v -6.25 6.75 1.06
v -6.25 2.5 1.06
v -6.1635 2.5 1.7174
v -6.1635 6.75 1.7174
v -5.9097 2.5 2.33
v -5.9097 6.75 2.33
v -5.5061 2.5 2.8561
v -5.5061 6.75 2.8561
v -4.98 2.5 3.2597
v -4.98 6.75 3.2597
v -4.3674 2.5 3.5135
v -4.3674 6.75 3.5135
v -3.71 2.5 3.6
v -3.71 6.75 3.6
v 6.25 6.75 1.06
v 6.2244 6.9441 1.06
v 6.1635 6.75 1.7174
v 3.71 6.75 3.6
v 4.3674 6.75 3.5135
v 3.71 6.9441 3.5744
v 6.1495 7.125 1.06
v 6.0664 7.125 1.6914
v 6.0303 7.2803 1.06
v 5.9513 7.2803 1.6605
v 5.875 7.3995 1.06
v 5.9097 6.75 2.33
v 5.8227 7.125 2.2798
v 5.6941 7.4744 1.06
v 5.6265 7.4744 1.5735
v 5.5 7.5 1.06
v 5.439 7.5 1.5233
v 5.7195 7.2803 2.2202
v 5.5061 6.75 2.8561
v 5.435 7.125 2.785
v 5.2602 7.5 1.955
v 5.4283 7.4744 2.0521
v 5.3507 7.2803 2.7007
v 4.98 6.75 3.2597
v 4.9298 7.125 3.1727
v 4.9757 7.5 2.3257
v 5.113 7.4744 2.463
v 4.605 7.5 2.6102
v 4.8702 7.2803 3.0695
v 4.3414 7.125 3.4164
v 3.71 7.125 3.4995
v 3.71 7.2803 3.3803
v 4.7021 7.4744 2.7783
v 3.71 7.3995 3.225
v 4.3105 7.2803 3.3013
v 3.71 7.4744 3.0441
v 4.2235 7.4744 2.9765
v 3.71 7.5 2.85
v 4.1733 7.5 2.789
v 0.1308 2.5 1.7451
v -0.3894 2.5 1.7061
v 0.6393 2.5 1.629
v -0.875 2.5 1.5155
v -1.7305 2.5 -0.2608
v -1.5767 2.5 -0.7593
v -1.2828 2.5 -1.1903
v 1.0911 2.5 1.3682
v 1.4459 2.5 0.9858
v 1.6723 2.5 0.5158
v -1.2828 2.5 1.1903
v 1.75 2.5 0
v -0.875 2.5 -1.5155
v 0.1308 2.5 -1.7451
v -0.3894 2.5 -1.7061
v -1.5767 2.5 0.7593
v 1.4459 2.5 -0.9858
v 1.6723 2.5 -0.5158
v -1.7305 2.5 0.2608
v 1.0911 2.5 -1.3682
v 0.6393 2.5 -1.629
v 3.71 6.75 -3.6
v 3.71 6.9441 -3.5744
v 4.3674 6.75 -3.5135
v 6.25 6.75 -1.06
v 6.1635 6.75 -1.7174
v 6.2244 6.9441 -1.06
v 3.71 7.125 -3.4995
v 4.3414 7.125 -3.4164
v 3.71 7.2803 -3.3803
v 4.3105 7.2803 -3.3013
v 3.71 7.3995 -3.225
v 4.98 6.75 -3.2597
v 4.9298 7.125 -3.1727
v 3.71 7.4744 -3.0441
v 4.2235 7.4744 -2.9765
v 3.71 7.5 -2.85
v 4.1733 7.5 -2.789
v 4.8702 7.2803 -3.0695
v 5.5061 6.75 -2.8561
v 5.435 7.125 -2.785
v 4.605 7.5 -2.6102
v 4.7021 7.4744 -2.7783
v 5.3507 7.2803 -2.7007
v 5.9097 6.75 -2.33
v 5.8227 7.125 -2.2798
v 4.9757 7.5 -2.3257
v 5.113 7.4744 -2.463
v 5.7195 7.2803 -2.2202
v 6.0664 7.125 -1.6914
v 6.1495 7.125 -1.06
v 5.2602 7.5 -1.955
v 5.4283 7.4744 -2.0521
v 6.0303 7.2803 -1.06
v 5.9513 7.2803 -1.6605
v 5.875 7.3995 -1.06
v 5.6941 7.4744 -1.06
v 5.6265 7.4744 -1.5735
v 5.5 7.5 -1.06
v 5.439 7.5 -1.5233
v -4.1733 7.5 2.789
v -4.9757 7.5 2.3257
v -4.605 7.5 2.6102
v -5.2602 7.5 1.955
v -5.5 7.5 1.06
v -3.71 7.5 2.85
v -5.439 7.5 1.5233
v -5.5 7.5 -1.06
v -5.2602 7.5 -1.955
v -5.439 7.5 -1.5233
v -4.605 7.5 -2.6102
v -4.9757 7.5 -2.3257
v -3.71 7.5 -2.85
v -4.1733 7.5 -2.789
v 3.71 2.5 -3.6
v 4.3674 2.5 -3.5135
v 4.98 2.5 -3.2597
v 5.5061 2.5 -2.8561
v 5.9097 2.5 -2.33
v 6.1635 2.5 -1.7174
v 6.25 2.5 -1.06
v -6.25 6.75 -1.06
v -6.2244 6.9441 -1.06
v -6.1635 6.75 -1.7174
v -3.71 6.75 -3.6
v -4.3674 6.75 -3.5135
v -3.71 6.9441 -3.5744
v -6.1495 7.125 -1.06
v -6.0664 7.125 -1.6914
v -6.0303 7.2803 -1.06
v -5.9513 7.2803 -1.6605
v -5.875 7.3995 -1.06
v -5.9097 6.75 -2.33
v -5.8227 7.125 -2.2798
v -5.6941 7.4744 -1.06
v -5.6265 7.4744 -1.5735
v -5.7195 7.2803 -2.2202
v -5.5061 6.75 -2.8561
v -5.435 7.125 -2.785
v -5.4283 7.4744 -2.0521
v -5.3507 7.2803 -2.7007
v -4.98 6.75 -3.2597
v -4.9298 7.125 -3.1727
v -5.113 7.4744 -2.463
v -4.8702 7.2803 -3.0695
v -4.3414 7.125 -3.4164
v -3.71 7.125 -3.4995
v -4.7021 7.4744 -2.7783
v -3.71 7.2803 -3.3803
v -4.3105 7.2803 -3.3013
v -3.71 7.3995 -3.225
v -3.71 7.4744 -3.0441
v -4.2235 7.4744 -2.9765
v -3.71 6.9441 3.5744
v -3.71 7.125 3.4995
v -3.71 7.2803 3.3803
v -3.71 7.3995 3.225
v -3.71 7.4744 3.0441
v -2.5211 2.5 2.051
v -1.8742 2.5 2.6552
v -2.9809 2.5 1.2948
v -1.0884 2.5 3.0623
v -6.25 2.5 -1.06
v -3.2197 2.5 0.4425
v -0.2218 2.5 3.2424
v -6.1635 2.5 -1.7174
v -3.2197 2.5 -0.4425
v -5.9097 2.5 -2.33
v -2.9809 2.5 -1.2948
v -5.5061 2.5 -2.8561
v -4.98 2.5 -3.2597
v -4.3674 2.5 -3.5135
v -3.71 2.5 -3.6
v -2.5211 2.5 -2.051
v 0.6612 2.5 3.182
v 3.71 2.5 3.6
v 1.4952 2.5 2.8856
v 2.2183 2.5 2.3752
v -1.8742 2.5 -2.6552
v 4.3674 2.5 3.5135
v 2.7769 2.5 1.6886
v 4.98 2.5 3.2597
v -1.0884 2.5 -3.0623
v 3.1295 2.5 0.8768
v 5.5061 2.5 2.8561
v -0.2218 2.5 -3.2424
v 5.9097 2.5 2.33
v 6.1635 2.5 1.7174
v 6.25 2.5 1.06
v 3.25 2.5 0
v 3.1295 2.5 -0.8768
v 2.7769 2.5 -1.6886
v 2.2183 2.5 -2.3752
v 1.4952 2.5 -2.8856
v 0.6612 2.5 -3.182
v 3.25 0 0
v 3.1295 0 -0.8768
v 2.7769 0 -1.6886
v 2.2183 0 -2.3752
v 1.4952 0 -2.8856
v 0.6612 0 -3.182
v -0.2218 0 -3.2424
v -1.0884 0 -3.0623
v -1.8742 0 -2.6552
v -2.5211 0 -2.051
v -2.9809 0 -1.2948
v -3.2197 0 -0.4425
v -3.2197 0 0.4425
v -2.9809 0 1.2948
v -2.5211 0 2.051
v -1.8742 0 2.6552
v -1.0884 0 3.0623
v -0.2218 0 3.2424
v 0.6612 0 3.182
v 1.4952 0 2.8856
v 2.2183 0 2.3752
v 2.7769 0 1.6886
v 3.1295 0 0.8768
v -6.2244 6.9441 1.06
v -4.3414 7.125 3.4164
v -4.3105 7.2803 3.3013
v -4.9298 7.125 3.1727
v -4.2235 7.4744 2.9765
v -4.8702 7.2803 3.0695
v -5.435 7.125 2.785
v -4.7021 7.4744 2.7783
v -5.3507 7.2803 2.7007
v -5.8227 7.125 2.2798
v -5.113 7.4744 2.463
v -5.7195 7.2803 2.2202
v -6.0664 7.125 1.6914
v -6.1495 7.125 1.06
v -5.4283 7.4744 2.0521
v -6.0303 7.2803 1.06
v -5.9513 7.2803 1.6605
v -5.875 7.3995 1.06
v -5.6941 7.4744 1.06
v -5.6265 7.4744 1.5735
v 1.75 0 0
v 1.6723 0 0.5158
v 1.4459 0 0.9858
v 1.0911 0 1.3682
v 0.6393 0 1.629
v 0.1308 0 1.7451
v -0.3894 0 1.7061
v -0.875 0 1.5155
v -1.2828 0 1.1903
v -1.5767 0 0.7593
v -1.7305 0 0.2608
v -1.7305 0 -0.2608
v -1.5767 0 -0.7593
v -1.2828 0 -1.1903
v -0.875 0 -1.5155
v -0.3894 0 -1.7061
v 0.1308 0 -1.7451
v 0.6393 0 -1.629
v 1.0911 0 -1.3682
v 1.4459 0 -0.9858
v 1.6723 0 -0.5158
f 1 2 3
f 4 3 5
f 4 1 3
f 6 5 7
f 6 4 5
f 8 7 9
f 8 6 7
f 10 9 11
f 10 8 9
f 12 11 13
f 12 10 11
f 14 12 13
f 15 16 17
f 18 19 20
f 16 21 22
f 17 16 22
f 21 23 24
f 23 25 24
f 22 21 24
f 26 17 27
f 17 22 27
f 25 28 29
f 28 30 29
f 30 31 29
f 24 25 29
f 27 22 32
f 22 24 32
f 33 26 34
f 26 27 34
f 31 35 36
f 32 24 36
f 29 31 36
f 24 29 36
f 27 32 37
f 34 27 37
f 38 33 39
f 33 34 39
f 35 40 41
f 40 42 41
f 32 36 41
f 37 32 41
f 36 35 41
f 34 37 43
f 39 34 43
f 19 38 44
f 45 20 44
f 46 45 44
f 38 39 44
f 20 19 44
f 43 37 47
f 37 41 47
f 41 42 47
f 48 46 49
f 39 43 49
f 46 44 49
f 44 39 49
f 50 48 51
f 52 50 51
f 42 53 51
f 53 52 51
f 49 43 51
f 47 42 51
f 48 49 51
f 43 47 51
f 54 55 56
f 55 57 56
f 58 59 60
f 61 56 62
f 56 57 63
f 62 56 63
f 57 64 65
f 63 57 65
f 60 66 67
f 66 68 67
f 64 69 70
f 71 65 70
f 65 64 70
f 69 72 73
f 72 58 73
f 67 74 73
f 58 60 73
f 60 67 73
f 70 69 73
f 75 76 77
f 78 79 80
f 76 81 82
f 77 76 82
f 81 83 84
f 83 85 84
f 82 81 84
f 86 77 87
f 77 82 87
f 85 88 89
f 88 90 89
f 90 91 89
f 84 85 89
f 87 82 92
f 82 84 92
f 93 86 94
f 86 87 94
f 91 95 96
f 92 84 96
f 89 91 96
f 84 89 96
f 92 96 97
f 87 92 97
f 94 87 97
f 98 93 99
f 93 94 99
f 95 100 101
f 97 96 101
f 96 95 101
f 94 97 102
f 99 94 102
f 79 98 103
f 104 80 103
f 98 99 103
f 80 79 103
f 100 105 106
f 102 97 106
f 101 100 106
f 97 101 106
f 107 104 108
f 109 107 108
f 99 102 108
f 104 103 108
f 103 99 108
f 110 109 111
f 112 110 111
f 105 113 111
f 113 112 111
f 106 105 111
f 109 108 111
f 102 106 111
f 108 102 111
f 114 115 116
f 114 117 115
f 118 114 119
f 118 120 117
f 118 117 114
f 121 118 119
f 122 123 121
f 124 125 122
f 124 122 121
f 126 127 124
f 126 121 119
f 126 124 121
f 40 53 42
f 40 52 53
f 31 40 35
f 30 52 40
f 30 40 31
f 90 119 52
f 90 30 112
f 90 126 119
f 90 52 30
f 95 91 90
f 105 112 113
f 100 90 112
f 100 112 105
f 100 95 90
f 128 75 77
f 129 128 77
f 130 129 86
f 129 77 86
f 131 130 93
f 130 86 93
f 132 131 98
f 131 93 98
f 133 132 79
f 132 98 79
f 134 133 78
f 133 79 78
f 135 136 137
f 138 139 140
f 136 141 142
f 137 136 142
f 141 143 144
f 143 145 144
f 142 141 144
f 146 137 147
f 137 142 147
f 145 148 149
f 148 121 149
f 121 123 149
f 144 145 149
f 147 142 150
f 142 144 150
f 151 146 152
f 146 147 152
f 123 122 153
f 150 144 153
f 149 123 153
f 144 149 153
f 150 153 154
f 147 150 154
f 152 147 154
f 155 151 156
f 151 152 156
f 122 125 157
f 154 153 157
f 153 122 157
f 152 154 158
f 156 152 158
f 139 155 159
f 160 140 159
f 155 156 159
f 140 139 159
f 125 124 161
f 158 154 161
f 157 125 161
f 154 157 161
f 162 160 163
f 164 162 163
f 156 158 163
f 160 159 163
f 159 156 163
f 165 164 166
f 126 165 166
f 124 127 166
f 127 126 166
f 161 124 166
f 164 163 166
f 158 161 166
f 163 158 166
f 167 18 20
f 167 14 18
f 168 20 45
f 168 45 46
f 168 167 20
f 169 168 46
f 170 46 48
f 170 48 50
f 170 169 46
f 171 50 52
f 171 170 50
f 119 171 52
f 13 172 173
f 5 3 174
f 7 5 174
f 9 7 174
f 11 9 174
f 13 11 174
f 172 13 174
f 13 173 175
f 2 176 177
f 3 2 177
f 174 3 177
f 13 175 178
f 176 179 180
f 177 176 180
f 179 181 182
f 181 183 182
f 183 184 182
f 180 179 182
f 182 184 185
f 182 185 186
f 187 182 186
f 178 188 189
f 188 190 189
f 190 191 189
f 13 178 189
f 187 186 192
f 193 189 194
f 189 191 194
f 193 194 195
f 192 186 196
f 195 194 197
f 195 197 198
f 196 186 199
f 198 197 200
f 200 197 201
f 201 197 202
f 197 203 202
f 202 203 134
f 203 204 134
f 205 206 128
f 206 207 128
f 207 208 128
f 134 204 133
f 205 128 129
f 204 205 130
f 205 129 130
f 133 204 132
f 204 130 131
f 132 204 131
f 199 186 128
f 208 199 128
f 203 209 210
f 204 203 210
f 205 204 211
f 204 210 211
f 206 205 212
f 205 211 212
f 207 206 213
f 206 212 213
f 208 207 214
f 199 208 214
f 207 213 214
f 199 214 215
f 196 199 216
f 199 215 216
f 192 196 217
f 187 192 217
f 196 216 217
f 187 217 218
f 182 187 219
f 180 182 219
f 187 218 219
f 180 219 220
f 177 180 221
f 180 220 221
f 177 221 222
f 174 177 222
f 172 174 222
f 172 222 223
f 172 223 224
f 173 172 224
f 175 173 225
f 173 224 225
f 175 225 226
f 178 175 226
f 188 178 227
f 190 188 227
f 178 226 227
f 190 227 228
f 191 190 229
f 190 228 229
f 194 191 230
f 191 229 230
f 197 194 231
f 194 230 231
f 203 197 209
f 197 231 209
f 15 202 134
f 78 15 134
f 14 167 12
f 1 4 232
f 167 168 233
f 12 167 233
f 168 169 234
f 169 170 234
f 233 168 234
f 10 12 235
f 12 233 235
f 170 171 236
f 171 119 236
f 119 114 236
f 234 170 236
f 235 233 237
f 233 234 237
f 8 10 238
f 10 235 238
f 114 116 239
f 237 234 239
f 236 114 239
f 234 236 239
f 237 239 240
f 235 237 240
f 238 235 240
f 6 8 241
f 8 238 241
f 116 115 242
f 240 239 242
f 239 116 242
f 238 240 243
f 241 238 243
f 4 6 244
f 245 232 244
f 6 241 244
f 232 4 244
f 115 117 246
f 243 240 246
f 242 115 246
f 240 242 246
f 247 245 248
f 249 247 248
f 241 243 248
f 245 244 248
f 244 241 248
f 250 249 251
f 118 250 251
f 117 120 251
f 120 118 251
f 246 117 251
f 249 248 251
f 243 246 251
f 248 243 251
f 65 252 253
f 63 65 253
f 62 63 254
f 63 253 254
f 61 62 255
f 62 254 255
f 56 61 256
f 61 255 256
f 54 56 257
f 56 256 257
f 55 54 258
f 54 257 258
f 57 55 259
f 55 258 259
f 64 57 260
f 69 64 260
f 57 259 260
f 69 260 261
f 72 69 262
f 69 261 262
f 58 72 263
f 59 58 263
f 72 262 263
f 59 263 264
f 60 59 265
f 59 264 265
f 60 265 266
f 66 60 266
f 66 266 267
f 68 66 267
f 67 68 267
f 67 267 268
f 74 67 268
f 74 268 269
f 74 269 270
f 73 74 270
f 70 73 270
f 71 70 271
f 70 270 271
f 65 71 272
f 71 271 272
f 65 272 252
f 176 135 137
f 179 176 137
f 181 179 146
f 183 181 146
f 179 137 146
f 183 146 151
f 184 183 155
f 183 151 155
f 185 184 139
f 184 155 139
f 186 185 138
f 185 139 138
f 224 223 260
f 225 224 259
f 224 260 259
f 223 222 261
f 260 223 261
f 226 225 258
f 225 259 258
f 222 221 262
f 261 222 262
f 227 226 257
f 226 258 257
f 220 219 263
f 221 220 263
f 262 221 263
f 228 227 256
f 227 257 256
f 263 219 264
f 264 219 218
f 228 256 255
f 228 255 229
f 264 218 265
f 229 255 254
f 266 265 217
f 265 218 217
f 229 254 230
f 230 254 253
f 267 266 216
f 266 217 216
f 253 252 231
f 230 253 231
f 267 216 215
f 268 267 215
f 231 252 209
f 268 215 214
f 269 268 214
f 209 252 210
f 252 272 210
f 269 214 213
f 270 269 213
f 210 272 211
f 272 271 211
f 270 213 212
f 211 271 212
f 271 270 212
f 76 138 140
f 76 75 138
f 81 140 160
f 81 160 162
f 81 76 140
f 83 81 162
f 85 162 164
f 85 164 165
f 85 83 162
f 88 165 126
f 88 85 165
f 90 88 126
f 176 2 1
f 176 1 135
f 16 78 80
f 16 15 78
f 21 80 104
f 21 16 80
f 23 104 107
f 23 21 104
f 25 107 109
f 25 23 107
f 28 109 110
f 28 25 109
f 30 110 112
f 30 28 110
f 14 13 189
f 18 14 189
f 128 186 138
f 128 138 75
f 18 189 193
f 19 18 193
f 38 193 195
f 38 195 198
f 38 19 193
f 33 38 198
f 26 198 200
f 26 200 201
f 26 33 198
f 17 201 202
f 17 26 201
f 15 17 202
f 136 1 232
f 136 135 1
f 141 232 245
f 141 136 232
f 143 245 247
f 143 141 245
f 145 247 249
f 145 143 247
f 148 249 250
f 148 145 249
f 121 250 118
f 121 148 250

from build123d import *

# Parameters (mm, degrees)
SKETCH1_R           = 3.25
BOSS_EXTRUDE1_DEPTH = 2.5
SKETCH2_R           = 1.75
CUT_EXTRUDE1_DEPTH  = 2.5
SKETCH3_W           = 12.5
SKETCH3_H           = 7.2
BOSS_EXTRUDE2_DEPTH = 5
FILLET1_R           = 2.54
FILLET2_R           = 0.75


with BuildPart() as part:
    # Sketch1 → Boss-Extrude1 (new body)
    with BuildSketch(Plane(origin=(0, 0, 0), x_dir=(1, 0, 0), z_dir=(0, 1, 0))):
        Circle(SKETCH1_R)
    extrude(amount=BOSS_EXTRUDE1_DEPTH)

    # Sketch2 → Cut-Extrude1 (cut)
    with BuildSketch(Plane.XZ):
        Circle(SKETCH2_R)
    extrude(amount=-CUT_EXTRUDE1_DEPTH, mode=Mode.SUBTRACT)

    # Sketch3 → Boss-Extrude2 (add)
    with BuildSketch(Plane(origin=(0, 2.5, 0), x_dir=(1, 0, 0), z_dir=(0, 1, 0))):
        Rectangle(SKETCH3_W, SKETCH3_H)
    extrude(amount=BOSS_EXTRUDE2_DEPTH)

    # Fillet1
    fillet1_edges = [part.edges().sort_by_distance(p)[0] for p in [
        (6.25, 5, 3.6),
        (6.25, 5, -3.6),
        (-6.25, 5, -3.6),
        (-6.25, 5, 3.6),
    ]]
    fillet(fillet1_edges, radius=FILLET1_R)

    # Fillet2
    fillet2_edges = [part.edges().sort_by_distance(p)[0] for p in [
        (-6.25, 7.5, 0),
        (0, 7.5, -3.6),
        (6.25, 7.5, 0),
        (0, 7.5, 3.6),
        (-5.506051224, 7.5, 2.856051224),
        (5.506051224, 7.5, 2.856051224),
        (5.506051224, 7.5, -2.856051224),
        (-5.506051224, 7.5, -2.856051224),
    ]]
    fillet(fillet2_edges, radius=FILLET2_R)


solid = part.part
